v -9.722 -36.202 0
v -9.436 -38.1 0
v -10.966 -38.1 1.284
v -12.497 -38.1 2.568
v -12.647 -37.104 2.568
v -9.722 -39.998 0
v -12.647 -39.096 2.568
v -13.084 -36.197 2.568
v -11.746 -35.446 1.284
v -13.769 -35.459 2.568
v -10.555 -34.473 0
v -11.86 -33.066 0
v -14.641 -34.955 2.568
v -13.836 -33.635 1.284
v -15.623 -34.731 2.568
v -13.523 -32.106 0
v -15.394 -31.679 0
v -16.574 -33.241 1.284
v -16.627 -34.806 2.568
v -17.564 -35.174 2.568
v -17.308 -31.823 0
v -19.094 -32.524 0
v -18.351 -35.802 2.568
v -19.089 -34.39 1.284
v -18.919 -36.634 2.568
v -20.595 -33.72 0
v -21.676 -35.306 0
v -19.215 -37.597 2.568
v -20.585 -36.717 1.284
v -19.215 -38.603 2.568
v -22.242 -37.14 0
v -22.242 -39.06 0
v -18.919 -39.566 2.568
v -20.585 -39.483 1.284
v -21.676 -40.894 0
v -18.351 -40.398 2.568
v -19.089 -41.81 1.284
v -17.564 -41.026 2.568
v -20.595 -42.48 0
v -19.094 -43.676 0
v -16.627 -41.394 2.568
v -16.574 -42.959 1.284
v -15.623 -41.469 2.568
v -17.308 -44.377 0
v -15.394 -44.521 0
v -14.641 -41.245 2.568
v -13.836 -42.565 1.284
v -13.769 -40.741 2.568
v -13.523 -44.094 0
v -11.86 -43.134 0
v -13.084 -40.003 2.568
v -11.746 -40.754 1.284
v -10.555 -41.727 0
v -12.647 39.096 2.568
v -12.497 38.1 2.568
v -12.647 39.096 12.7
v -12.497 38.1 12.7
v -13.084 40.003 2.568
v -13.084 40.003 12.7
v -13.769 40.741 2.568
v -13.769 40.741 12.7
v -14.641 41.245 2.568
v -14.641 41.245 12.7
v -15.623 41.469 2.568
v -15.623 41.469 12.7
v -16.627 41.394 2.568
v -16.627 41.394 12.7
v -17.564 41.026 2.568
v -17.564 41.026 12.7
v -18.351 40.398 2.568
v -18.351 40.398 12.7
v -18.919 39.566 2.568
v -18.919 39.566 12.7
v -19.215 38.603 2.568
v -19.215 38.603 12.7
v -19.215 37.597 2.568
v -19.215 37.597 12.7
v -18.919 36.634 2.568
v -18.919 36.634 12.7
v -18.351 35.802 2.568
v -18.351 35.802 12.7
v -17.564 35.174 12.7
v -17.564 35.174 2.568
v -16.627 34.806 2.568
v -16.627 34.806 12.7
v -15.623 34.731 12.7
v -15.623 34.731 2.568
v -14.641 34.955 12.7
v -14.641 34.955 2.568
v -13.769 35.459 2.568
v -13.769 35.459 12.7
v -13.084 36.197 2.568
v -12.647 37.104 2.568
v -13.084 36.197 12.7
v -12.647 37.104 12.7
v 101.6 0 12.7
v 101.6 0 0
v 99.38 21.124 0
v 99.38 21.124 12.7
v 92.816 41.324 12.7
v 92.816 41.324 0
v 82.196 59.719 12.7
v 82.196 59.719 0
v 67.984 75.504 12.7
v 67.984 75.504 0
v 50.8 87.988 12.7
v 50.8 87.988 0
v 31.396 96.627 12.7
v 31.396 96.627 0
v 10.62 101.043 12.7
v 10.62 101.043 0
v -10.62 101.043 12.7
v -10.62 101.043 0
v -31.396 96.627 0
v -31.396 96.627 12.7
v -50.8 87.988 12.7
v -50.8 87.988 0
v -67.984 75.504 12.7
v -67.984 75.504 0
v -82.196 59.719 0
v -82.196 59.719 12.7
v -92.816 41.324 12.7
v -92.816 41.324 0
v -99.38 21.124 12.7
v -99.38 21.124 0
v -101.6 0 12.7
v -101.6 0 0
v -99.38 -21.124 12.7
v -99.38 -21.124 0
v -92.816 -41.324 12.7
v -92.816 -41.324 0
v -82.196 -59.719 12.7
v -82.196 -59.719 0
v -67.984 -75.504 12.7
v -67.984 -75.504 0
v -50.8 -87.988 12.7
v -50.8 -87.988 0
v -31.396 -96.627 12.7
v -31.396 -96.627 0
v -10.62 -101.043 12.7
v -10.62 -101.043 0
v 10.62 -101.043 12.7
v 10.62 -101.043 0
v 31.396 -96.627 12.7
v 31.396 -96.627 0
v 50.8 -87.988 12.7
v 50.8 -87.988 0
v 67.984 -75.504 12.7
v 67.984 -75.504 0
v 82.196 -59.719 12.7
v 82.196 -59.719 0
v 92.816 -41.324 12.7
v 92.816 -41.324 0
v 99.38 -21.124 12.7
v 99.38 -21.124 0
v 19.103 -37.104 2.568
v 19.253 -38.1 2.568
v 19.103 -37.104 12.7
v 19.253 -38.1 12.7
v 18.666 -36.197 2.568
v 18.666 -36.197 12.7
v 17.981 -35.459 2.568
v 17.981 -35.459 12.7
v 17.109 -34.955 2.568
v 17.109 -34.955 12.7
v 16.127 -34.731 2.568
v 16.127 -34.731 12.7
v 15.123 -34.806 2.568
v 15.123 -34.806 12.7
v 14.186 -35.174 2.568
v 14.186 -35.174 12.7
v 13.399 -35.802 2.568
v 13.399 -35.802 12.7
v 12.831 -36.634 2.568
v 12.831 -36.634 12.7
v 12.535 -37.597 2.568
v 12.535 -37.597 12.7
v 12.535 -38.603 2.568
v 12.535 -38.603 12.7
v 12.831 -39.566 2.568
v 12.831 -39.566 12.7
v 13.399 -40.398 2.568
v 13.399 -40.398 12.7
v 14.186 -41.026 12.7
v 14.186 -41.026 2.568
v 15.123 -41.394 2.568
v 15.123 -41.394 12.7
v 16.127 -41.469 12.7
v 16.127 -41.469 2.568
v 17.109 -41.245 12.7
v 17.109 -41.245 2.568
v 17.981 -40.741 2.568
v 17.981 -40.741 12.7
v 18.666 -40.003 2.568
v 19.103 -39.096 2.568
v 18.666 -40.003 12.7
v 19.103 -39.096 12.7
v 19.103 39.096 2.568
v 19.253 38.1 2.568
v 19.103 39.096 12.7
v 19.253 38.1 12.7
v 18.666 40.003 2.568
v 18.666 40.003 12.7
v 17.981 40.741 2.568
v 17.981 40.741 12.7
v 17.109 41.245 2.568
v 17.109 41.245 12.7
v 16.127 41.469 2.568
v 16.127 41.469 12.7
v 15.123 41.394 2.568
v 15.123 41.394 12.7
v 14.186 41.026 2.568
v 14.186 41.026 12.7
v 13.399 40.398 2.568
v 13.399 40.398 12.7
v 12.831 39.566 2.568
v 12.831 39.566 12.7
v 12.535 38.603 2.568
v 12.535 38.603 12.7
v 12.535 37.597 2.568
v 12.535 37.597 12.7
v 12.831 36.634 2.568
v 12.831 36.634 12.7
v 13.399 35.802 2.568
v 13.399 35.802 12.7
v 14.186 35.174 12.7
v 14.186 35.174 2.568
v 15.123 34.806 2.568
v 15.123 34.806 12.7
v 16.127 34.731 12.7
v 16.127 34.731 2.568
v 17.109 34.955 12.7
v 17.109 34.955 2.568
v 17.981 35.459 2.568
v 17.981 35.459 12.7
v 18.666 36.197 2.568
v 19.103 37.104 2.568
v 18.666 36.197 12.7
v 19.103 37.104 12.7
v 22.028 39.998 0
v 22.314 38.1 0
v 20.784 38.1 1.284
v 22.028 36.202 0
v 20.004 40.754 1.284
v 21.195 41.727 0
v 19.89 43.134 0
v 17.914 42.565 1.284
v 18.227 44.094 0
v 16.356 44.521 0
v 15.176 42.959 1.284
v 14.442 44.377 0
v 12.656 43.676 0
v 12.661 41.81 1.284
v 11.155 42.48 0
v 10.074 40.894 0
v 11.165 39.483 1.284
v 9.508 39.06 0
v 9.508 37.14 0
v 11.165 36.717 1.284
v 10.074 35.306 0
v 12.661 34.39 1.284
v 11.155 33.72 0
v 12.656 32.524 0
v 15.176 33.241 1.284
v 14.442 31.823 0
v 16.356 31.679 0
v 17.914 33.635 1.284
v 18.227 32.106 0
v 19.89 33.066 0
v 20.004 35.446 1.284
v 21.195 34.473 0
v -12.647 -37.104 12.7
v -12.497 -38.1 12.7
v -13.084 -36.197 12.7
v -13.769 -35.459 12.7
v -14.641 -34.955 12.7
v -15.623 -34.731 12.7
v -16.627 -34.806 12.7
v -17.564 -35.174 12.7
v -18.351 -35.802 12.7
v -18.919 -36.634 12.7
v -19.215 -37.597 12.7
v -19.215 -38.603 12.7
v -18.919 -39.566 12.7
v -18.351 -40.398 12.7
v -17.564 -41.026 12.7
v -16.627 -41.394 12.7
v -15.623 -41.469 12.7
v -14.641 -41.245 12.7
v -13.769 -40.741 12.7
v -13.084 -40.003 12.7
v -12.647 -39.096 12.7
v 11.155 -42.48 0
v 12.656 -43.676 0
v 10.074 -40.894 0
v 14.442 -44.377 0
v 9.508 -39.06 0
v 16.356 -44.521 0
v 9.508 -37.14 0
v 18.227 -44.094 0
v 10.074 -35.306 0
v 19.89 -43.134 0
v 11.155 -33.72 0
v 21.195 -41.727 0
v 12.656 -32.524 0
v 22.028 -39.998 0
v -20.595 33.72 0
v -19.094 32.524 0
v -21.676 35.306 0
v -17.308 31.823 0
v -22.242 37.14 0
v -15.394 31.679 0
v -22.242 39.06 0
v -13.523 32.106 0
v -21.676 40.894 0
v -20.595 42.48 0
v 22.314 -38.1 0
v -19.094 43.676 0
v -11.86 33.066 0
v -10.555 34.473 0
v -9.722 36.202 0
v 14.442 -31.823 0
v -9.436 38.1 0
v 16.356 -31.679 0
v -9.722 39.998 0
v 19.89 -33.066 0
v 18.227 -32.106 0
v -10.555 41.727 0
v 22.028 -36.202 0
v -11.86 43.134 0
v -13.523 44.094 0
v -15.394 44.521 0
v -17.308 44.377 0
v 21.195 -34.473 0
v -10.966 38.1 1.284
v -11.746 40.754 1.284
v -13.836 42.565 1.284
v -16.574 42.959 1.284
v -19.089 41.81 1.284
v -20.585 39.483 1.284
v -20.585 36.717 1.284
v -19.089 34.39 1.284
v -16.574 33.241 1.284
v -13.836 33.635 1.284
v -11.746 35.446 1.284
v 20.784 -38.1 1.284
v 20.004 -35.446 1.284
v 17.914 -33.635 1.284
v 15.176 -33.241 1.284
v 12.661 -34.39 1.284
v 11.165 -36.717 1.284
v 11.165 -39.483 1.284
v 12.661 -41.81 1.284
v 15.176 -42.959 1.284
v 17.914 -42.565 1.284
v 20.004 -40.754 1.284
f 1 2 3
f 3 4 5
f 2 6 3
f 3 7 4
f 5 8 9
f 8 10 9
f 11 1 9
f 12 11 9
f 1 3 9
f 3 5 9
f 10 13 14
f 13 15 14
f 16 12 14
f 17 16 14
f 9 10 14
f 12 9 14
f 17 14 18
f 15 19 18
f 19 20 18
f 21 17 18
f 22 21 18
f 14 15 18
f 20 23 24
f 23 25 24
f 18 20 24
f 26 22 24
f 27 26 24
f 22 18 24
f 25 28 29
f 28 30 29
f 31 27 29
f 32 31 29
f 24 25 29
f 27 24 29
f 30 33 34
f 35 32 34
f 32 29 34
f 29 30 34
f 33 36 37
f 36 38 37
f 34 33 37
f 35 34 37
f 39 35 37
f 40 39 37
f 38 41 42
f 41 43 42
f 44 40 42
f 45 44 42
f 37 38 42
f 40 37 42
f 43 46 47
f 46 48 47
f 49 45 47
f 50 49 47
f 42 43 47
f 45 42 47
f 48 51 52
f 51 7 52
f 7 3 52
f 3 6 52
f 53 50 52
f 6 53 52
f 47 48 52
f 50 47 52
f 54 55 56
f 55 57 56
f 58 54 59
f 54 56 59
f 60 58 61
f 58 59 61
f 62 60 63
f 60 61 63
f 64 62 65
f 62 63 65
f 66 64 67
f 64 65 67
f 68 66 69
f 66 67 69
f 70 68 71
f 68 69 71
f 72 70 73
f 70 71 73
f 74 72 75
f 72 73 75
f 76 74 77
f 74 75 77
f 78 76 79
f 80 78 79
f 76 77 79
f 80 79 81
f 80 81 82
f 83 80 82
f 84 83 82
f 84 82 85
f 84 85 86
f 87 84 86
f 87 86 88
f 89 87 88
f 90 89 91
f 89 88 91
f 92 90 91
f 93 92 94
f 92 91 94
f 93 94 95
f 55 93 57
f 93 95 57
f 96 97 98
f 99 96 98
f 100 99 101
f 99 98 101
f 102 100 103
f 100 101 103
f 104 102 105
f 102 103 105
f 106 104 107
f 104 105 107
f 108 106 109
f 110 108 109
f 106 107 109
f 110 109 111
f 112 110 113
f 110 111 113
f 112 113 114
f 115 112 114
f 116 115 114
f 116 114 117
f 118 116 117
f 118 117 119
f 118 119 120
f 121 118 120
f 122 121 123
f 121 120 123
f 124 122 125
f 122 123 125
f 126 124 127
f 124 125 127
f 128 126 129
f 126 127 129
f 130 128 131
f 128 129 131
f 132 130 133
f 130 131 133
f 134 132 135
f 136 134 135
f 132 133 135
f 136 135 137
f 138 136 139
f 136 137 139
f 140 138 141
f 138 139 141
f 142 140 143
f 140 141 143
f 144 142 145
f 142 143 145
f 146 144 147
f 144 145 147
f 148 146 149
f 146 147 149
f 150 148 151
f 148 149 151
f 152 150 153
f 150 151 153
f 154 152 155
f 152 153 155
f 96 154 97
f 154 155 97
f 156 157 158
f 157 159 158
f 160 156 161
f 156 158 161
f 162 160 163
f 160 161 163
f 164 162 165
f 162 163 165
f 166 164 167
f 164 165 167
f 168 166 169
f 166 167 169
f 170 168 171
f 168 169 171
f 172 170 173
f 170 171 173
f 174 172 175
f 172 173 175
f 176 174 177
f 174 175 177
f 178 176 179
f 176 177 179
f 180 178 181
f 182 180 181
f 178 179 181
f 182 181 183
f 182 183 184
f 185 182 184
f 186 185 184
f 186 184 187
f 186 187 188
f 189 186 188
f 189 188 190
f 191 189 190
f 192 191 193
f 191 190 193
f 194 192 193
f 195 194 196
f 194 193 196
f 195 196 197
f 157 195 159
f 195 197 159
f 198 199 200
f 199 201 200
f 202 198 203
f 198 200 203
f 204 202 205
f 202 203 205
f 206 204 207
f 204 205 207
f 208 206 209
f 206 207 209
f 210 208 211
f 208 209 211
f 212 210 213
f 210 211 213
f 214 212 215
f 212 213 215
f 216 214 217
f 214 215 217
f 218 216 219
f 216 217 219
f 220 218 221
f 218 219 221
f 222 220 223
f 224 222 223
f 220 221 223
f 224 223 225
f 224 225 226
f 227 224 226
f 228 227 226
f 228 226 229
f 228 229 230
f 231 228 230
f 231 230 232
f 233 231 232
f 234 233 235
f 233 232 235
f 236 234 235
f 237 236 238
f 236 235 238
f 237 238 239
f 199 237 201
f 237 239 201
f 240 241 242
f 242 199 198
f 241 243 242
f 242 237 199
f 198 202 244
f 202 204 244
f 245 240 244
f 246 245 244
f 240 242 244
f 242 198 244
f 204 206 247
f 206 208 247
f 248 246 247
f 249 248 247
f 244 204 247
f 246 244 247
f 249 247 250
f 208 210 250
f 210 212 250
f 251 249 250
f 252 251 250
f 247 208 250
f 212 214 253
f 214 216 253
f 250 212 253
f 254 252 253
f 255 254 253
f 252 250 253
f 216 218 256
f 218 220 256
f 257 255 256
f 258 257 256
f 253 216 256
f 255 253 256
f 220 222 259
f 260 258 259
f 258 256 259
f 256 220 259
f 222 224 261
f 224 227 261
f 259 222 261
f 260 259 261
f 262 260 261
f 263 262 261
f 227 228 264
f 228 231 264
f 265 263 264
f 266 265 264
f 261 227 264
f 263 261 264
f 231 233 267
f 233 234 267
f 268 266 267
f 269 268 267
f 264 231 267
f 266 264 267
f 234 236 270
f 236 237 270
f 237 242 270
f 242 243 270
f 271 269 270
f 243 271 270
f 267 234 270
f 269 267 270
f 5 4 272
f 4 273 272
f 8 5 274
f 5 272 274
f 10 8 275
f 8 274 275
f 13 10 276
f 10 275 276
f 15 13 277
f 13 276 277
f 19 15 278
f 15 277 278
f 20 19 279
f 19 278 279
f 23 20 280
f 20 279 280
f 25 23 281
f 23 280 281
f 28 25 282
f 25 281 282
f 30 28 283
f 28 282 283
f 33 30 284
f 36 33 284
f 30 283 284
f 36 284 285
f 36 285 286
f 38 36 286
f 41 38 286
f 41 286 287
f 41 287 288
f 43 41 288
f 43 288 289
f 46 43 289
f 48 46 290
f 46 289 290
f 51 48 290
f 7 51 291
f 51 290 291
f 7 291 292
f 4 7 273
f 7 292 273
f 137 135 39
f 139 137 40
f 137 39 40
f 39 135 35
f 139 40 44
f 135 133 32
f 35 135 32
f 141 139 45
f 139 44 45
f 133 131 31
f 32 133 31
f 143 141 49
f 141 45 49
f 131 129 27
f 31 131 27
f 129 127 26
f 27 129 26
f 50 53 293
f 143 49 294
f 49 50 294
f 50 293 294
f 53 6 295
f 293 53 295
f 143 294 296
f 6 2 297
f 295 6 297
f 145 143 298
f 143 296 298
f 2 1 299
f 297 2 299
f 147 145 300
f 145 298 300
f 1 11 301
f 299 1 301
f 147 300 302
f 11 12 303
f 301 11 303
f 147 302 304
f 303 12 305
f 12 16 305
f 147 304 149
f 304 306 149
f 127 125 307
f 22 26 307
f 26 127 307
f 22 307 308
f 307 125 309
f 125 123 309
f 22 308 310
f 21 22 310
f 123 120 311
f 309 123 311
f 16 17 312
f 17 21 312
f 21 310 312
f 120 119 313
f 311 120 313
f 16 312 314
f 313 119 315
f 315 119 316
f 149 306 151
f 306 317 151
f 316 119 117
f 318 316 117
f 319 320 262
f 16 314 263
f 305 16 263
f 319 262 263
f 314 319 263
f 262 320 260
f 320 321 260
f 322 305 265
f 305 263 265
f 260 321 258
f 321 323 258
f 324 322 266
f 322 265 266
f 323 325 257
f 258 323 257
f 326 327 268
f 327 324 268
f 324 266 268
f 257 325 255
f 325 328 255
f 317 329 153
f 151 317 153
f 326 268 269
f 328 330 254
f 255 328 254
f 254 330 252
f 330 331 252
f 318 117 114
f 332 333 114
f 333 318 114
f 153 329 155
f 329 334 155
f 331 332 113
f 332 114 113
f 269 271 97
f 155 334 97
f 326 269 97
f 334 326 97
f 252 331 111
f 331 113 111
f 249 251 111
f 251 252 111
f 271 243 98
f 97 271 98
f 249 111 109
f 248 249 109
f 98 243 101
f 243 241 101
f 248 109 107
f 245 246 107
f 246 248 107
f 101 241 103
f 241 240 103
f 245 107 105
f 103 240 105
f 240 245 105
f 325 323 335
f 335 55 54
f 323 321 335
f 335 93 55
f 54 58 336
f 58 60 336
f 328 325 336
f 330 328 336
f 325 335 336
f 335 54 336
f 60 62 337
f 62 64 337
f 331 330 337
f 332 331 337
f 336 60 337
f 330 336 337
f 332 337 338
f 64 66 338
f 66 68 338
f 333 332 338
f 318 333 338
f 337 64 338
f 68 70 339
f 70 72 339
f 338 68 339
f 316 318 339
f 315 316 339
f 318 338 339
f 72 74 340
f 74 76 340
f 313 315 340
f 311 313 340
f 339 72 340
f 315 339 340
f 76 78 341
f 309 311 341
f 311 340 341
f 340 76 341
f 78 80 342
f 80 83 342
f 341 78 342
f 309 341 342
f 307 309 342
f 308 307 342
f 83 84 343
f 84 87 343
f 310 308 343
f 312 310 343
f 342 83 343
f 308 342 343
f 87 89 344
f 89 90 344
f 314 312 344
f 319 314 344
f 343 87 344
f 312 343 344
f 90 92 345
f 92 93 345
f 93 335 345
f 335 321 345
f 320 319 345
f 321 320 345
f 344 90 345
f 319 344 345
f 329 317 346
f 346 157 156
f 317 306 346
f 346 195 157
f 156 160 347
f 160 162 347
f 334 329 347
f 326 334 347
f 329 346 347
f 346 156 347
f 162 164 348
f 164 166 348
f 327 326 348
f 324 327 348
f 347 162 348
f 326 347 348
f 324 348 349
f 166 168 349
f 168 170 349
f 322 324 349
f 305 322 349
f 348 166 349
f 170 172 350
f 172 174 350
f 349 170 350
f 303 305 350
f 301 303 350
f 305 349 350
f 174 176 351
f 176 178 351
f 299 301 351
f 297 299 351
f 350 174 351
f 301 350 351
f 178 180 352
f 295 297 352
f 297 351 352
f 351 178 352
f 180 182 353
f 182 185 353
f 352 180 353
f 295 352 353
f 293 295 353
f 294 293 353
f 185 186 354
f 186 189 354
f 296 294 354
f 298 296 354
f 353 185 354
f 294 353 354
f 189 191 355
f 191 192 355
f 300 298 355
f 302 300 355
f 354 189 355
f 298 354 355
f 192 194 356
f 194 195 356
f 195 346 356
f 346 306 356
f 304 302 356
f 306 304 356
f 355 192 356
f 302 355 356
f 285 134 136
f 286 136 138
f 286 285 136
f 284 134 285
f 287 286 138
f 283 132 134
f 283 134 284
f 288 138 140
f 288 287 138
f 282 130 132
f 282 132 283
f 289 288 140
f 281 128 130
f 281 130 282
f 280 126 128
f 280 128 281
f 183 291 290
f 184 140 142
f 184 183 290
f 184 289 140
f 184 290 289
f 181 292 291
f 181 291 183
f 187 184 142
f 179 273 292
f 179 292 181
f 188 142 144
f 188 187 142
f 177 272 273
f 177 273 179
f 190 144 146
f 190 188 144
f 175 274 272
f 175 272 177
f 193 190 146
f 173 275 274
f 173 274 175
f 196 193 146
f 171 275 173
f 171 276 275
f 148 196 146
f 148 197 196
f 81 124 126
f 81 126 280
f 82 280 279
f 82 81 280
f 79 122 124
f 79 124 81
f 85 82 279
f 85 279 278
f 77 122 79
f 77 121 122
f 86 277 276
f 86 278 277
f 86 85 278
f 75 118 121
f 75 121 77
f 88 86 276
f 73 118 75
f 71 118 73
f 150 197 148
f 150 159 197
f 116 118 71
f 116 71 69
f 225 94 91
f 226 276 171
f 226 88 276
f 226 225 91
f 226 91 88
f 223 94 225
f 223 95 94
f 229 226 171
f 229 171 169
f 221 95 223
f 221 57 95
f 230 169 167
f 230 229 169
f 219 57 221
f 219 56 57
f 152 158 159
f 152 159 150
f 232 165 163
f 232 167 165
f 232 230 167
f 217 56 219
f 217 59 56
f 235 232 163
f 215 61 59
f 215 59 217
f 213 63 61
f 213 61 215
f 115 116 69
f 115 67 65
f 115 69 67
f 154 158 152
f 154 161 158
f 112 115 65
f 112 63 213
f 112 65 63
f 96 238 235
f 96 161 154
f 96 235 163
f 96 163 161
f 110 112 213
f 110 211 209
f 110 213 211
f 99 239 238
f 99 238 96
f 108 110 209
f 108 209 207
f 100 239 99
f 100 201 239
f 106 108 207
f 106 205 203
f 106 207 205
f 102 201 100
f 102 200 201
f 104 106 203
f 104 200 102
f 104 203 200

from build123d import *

# Parameters (mm, degrees)
SKETCH1_R                                           = 101.6
BOSS_EXTRUDE1_DEPTH                                 = 12.7
CSK_FOR_1_4_FLAT_HEAD_MACHINE_SCREW_100_D           = 6.7564
CSK_FOR_1_4_FLAT_HEAD_MACHINE_SCREW_100_DEPTH       = 25.4
CSK_FOR_1_4_FLAT_HEAD_MACHINE_SCREW_100_CSINK_D     = 12.8778
CSK_FOR_1_4_FLAT_HEAD_MACHINE_SCREW_100_CSINK_ANGLE = 100
CSK_FOR_1_4_FLAT_HEAD_MACHINE_SCREW_100_TIP         = 2.029827343


with BuildPart() as part:
    # Sketch1 → Boss-Extrude1 (new body)
    with BuildSketch(Plane.XY):
        Circle(SKETCH1_R)
    extrude(amount=BOSS_EXTRUDE1_DEPTH)

    # CSK for 1/4 Flat Head Machine Screw (100)1
    with Locations(Plane(origin=(0, 0, 0), x_dir=(-1, 0, 0), z_dir=(0, 0, -1))):
        with Locations((-15.875, -38.1), (-15.875, 38.1), (15.875, 38.1), (15.875, -38.1)):
            CounterSinkHole(CSK_FOR_1_4_FLAT_HEAD_MACHINE_SCREW_100_D / 2, CSK_FOR_1_4_FLAT_HEAD_MACHINE_SCREW_100_CSINK_D / 2, depth=CSK_FOR_1_4_FLAT_HEAD_MACHINE_SCREW_100_DEPTH, counter_sink_angle=CSK_FOR_1_4_FLAT_HEAD_MACHINE_SCREW_100_CSINK_ANGLE)
            with Locations((0, 0, -(CSK_FOR_1_4_FLAT_HEAD_MACHINE_SCREW_100_DEPTH + CSK_FOR_1_4_FLAT_HEAD_MACHINE_SCREW_100_TIP / 2))):  # 118° drill point
                Cone(0, CSK_FOR_1_4_FLAT_HEAD_MACHINE_SCREW_100_D / 2, CSK_FOR_1_4_FLAT_HEAD_MACHINE_SCREW_100_TIP, mode=Mode.SUBTRACT)


solid = part.part
